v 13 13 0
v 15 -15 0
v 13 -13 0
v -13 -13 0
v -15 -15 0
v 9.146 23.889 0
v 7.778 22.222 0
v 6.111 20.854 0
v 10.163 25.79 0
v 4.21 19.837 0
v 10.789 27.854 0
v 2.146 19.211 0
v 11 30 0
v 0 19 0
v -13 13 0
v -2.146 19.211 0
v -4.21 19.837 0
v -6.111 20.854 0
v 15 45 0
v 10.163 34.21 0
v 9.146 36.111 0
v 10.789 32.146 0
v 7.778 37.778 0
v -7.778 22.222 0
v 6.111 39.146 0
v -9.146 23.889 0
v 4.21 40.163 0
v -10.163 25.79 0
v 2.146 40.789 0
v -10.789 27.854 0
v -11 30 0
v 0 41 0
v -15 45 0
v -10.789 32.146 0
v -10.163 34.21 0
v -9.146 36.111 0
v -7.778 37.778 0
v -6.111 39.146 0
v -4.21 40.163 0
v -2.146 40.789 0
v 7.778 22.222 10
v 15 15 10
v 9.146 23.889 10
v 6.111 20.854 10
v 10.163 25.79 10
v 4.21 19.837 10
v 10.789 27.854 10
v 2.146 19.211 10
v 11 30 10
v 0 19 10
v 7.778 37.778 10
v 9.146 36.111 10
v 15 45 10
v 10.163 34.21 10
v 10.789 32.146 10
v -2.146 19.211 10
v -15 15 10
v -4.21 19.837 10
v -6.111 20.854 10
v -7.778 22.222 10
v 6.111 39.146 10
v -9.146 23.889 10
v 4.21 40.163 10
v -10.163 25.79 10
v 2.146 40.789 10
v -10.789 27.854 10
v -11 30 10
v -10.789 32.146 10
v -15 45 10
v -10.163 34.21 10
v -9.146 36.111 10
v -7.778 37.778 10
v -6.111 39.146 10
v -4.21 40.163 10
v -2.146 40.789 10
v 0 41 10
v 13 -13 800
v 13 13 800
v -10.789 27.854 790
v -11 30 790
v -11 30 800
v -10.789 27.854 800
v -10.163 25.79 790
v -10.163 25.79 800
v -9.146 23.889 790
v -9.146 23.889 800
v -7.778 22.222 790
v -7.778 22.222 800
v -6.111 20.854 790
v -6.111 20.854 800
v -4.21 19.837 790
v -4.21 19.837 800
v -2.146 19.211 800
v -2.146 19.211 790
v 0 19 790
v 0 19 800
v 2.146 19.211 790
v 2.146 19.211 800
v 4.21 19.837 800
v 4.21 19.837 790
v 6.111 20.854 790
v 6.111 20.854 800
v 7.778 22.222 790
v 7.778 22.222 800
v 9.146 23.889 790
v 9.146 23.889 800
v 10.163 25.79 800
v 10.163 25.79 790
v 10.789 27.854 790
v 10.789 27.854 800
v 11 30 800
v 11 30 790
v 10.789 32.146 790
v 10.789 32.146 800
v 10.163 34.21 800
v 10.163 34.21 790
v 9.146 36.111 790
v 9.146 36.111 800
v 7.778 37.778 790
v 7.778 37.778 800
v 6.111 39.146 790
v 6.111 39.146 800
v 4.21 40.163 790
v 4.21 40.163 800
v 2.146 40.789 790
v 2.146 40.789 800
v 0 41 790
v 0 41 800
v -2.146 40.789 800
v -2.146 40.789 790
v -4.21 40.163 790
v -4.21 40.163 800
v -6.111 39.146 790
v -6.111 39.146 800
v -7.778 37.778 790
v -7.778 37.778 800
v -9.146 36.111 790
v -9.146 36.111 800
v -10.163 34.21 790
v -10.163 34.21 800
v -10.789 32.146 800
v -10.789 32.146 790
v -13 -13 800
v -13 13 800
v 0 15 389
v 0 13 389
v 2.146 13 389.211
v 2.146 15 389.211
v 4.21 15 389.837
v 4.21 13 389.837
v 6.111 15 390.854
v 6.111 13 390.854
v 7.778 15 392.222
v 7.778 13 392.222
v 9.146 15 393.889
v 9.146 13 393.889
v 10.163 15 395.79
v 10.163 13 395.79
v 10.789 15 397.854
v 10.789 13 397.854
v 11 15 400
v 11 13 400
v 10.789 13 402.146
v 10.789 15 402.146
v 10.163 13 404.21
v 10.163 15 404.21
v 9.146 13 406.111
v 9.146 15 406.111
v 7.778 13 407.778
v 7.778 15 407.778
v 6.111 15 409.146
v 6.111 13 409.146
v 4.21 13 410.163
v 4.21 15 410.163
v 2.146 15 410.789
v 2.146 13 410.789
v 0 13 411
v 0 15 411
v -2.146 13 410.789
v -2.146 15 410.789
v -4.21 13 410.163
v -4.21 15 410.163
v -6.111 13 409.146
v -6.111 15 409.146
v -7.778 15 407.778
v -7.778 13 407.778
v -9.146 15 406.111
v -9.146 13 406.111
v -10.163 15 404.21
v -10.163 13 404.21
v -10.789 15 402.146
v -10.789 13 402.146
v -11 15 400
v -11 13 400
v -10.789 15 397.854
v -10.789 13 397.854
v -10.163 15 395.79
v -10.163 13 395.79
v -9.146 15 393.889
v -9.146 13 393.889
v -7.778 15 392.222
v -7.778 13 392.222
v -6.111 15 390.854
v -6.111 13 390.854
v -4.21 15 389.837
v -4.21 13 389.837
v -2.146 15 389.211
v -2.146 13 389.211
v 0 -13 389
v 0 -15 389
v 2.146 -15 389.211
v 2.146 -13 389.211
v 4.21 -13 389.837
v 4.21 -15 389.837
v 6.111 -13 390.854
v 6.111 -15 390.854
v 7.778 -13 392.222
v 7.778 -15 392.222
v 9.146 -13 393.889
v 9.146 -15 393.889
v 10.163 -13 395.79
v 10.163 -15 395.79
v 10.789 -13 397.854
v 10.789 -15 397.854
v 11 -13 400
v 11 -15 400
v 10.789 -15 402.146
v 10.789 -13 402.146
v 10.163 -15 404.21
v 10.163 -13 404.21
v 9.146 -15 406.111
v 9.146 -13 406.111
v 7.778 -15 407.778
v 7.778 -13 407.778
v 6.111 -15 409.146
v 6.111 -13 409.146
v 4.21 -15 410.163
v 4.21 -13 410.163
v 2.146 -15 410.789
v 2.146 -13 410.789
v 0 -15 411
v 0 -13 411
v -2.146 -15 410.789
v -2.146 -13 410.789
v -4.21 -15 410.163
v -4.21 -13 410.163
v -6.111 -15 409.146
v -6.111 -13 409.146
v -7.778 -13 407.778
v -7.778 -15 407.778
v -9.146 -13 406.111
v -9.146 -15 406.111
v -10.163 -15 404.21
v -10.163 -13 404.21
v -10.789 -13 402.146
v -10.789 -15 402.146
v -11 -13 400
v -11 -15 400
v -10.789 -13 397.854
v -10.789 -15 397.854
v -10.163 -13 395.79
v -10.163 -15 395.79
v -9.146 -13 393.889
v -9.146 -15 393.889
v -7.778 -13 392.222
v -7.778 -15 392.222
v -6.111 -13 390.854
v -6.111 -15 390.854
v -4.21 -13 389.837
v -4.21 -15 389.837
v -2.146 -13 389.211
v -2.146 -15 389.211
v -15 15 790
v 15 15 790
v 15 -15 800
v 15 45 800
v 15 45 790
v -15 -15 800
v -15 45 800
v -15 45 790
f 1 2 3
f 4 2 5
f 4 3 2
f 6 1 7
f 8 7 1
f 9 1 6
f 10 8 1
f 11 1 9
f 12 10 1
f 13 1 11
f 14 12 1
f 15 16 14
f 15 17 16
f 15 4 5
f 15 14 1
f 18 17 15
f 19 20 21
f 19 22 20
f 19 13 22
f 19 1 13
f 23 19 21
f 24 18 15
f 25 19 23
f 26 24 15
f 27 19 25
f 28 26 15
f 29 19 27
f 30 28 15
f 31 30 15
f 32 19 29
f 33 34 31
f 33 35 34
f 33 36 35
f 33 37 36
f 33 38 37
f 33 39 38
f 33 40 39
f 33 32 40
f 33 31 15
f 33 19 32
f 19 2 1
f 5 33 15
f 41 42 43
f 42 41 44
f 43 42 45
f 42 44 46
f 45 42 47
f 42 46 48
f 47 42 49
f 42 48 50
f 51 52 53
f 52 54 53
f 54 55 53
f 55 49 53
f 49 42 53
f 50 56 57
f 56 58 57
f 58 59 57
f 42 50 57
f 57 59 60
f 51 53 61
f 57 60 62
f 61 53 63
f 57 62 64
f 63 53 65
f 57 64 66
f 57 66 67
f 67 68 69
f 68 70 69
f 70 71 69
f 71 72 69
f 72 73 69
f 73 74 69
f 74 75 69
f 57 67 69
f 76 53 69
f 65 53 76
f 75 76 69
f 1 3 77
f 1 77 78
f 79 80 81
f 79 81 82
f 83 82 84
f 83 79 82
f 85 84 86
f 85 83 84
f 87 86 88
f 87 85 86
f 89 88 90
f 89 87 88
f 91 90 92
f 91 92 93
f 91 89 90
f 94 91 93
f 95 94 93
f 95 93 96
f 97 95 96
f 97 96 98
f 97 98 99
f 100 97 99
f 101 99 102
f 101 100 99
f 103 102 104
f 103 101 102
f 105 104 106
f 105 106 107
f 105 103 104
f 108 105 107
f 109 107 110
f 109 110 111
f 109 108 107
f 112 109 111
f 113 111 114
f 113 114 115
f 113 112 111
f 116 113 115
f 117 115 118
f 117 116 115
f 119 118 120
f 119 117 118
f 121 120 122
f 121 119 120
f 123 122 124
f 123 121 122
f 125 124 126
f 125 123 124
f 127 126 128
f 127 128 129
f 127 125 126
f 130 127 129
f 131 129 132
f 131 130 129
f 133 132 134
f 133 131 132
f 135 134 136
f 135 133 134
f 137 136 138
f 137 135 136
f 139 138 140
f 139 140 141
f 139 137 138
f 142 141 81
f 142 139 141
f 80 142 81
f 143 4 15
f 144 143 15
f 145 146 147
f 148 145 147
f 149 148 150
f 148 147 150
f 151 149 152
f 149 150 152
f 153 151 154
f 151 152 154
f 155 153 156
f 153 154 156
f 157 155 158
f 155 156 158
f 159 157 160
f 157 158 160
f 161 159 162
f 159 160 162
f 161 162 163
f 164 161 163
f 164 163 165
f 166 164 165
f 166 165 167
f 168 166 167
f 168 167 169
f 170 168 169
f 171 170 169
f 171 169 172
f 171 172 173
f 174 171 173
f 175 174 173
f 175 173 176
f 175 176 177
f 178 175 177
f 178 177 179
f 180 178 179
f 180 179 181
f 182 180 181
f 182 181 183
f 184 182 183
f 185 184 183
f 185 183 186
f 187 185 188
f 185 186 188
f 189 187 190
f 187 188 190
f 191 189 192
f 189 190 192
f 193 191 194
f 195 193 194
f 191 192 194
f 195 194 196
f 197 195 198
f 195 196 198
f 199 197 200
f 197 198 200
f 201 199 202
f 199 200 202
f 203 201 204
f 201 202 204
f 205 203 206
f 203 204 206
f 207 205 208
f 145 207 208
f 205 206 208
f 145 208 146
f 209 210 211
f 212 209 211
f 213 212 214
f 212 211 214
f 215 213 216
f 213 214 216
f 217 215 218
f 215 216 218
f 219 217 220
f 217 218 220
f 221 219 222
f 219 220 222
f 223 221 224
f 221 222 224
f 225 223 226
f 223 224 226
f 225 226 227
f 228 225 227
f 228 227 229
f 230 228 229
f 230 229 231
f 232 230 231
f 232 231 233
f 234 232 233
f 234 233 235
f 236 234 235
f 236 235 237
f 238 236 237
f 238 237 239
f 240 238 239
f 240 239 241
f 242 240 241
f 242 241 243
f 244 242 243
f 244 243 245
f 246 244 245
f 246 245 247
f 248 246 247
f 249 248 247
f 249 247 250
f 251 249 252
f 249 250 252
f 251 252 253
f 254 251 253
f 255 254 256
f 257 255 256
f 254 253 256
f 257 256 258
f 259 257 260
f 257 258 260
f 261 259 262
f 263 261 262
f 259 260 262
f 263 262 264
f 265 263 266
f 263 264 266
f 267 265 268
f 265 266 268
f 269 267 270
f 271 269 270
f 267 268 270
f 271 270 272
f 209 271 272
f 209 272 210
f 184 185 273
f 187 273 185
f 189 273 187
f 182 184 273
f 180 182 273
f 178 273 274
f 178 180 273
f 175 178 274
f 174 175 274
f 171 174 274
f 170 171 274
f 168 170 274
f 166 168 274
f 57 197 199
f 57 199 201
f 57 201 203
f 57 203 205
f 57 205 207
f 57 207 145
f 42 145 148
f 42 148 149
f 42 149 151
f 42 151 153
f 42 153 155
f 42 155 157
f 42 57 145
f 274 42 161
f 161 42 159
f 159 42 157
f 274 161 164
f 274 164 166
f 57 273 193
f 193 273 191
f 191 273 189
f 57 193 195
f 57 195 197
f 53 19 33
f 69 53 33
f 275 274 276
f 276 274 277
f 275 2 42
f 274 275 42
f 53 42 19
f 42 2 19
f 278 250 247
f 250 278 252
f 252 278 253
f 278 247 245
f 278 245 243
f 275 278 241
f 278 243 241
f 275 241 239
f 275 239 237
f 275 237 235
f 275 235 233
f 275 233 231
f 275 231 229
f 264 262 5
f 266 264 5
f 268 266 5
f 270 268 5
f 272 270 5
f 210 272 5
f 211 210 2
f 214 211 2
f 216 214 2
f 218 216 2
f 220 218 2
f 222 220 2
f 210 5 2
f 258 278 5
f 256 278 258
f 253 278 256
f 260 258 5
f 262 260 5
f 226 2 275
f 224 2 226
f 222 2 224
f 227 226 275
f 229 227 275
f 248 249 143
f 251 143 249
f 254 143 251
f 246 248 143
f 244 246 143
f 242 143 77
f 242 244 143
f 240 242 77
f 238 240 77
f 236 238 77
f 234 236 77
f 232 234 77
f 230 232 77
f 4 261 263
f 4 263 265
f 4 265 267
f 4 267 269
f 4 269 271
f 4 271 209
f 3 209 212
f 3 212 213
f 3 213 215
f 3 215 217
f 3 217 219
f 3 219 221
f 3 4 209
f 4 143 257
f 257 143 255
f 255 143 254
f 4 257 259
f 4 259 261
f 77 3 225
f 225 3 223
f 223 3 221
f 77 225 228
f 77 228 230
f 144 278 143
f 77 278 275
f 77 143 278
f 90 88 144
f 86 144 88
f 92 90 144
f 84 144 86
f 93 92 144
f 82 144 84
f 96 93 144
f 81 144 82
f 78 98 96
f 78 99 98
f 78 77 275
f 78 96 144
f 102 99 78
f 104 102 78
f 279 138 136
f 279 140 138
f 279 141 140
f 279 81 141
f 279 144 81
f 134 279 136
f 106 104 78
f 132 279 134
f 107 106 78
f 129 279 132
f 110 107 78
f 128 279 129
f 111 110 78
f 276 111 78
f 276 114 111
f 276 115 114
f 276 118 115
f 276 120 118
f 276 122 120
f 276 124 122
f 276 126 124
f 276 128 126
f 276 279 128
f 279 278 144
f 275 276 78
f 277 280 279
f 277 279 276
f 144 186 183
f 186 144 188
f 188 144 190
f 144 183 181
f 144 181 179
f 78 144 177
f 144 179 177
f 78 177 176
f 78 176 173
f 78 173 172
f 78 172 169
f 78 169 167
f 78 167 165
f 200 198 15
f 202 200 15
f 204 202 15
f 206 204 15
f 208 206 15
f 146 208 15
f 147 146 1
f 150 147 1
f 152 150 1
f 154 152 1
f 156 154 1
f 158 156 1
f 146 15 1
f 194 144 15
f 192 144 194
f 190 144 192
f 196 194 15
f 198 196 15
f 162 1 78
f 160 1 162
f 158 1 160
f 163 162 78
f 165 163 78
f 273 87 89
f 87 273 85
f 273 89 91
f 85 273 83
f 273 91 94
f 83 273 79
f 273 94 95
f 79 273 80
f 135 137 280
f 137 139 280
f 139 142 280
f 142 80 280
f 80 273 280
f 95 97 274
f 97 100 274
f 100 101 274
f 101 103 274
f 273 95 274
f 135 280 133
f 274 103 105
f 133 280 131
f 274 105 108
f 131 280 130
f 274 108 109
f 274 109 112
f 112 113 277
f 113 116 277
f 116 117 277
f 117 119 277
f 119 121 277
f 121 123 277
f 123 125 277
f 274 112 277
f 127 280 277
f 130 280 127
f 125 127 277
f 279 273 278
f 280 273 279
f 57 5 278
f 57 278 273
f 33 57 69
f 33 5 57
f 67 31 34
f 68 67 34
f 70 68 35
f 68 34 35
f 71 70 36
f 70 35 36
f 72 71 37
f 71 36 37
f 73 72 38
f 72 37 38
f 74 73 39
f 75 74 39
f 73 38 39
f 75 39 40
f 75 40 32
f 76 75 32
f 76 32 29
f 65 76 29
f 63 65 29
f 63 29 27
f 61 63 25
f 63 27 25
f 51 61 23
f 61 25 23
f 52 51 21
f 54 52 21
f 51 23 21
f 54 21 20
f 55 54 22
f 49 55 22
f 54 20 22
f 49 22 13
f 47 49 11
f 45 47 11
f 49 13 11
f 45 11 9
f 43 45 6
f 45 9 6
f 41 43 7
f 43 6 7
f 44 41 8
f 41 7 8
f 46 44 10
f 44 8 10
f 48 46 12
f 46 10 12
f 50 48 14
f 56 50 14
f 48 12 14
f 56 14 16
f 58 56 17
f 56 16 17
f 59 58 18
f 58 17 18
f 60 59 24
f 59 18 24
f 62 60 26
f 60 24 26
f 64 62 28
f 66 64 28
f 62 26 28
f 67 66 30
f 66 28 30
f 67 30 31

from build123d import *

# Parameters (mm, degrees)
SKETCH1_W           = 30
SKETCH1_H           = 30
SKETCH1_W_2         = 26
SKETCH1_H_2         = 26
BOSS_EXTRUDE1_DEPTH = 800
SKETCH2_W           = 30
SKETCH2_H           = 30
SKETCH2_R           = 11
BOSS_EXTRUDE2_DEPTH = 10
BOSS_EXTRUDE3_START = -10
SKETCH3_W           = 30
SKETCH3_H           = 30
SKETCH3_R           = 11
BOSS_EXTRUDE3_DEPTH = 10
SKETCH4_R           = 11
CUT_EXTRUDE1_DEPTH  = 50


with BuildPart() as part:
    # Sketch1 → Boss-Extrude1 (new body)
    with BuildSketch(Plane.XY):
        Rectangle(SKETCH1_W, SKETCH1_H)
        Rectangle(SKETCH1_W_2, SKETCH1_H_2, mode=Mode.SUBTRACT)
    extrude(amount=BOSS_EXTRUDE1_DEPTH)

    # Sketch2 → Boss-Extrude2 (add)
    with BuildSketch(Plane(origin=(0, 0, 0), x_dir=(-1, 0, 0), z_dir=(0, 0, -1))):
        with Locations((0, 30)):
            Rectangle(SKETCH2_W, SKETCH2_H)
        with Locations((0, 30)):
            Circle(SKETCH2_R, mode=Mode.SUBTRACT)
    extrude(amount=-BOSS_EXTRUDE2_DEPTH)

    # Sketch3 → Boss-Extrude3 (add)
    with BuildSketch(Plane.XY.offset(800).offset(BOSS_EXTRUDE3_START)):
        with Locations((0, 30)):
            Rectangle(SKETCH3_W, SKETCH3_H)
        with Locations(Location((0, 30, 0), (0, 0, 180))):
            Circle(SKETCH3_R, mode=Mode.SUBTRACT)
    extrude(amount=BOSS_EXTRUDE3_DEPTH)

    # Sketch4 → Cut-Extrude1 (cut)
    with BuildSketch(Plane.XZ.offset(15)):
        with Locations(Location((0, 400, 0), (0, 0, 270))):
            Circle(SKETCH4_R)
    extrude(amount=-CUT_EXTRUDE1_DEPTH, mode=Mode.SUBTRACT)


solid = part.part
